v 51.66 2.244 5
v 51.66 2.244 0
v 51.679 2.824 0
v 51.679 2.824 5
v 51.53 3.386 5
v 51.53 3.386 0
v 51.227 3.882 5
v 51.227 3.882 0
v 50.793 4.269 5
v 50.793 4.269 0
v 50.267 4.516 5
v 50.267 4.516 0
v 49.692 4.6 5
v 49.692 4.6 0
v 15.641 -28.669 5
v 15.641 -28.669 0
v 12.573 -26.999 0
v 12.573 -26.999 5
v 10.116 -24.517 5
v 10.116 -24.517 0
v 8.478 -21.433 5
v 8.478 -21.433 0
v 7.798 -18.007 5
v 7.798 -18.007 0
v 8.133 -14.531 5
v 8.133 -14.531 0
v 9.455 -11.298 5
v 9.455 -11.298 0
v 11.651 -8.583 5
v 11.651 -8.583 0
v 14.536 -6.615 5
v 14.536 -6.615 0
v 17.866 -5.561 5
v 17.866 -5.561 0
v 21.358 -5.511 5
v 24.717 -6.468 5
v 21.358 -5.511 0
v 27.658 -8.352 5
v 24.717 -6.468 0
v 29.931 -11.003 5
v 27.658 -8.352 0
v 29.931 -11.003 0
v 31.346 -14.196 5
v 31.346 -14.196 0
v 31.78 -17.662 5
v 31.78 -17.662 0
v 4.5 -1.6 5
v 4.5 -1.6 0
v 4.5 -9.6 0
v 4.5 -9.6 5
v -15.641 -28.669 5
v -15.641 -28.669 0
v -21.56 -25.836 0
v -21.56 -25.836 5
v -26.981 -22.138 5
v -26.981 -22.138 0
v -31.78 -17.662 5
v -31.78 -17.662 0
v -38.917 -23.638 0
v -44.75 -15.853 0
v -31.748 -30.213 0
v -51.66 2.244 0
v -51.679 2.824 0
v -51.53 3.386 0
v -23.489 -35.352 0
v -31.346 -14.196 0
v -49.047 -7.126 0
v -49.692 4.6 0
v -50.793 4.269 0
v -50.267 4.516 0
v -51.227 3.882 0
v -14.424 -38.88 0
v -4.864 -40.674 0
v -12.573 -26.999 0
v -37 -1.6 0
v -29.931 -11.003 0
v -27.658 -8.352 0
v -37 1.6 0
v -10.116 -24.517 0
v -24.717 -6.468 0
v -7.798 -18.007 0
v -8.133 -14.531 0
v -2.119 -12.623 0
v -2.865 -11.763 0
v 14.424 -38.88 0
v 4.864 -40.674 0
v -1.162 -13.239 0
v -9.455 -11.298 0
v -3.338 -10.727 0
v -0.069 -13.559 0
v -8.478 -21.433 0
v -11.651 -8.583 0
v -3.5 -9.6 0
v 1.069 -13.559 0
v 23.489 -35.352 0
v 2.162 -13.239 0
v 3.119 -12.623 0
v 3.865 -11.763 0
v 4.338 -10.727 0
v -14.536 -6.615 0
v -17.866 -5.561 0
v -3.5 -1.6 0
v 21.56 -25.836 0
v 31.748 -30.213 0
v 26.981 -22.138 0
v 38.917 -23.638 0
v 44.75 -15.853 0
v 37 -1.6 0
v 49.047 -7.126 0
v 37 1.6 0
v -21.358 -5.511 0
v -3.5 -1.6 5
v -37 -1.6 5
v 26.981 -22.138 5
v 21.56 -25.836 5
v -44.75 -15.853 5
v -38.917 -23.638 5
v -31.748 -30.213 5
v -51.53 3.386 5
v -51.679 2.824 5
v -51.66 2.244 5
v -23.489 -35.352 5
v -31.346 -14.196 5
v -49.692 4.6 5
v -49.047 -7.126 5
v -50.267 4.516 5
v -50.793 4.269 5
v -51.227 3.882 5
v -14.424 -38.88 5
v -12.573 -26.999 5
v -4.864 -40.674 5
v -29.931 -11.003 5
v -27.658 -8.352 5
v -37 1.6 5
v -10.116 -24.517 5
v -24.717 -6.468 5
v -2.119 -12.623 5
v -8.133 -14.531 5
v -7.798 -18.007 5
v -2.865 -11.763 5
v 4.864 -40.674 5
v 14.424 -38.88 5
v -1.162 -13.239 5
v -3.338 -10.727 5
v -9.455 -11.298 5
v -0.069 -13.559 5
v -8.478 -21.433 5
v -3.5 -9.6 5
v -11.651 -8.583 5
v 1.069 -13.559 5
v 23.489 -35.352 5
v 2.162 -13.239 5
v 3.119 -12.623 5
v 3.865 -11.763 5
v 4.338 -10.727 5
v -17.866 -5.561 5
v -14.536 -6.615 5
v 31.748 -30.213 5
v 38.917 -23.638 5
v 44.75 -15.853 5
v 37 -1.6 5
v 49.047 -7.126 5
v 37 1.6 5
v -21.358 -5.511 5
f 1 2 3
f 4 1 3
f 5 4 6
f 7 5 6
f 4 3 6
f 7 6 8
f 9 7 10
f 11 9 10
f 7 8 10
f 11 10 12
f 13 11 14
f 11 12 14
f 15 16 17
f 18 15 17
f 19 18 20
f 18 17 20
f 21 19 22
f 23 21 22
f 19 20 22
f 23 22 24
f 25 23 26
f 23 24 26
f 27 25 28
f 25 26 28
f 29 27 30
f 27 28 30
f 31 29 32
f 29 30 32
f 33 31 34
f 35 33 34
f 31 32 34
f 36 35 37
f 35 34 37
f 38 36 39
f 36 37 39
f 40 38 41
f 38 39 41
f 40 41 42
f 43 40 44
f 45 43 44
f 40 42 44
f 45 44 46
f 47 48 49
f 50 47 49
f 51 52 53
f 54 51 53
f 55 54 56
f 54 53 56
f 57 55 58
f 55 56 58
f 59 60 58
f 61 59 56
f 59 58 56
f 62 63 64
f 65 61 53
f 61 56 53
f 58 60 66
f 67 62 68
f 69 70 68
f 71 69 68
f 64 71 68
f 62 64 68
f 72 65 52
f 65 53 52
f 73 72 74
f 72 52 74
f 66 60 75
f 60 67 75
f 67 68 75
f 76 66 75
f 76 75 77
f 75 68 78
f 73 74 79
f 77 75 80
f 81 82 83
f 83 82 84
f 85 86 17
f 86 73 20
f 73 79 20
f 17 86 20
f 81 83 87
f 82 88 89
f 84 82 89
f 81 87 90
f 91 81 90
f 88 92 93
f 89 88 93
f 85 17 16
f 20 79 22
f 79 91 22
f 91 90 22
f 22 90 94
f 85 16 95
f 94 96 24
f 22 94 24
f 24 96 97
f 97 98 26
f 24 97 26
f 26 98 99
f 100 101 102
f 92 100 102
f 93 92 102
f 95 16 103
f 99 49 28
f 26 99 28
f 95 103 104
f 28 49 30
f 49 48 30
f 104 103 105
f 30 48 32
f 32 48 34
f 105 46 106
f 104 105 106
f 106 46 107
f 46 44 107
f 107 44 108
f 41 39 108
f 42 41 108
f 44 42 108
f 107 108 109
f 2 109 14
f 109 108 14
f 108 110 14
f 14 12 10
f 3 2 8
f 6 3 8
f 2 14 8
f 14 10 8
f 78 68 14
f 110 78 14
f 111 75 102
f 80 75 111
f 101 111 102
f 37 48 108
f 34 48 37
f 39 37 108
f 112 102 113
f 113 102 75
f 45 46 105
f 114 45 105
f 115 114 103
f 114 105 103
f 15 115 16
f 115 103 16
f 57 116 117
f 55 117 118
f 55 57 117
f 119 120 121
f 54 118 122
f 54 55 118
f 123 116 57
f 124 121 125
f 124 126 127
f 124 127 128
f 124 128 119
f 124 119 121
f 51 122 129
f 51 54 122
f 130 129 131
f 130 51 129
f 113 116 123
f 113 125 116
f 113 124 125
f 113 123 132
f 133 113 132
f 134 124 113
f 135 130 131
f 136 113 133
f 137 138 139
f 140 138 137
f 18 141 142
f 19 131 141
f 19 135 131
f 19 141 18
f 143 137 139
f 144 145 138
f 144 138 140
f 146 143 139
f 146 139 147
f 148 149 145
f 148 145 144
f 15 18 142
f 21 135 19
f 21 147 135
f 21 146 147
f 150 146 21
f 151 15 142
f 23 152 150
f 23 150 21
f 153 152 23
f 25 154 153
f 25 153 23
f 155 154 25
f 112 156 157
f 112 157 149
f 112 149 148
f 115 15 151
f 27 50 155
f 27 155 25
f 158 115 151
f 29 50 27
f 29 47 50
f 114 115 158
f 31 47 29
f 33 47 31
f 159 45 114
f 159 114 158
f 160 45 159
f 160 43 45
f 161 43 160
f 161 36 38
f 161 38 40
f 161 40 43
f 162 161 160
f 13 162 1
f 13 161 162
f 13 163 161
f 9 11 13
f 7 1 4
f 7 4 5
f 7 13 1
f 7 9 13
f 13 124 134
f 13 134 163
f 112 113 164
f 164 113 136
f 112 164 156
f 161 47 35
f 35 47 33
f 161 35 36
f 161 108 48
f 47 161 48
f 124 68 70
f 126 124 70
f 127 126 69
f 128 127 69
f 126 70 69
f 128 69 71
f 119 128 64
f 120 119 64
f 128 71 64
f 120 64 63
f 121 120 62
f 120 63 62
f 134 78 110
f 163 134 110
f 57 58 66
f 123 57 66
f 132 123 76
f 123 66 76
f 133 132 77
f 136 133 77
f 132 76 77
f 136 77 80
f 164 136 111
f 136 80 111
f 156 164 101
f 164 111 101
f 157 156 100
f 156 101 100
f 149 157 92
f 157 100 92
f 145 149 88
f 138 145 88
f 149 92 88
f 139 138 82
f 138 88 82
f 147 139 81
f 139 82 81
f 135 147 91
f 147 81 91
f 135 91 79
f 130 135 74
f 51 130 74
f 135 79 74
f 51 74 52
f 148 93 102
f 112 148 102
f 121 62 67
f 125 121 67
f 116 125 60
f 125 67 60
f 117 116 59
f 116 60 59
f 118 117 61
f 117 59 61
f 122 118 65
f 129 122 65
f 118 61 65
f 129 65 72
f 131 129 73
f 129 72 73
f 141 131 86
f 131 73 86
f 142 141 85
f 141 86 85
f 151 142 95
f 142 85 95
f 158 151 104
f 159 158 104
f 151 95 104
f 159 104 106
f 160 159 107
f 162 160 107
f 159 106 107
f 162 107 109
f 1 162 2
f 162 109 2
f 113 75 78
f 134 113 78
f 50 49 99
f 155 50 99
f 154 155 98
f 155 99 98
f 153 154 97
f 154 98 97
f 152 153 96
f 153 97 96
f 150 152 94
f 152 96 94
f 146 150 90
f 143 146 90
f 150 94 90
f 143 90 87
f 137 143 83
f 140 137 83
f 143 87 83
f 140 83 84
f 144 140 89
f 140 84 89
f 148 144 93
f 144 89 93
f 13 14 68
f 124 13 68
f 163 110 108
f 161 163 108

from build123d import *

# Parameters (mm, degrees)
SALIENTE_EXTRUIR1_DEPTH = 5
SALIENTE_EXTRUIR2_DEPTH = 5


with BuildPart() as part:
    # Croquis1 → Saliente-Extruir1 (new body)
    with BuildSketch(Plane.XY):
        with BuildLine():
            ThreePointArc((-51.659530699, 2.243564356), (0, -40.9), (51.659530699, 2.243564356))
            ThreePointArc((51.659530699, 2.243564356), (51.226617189, 3.88201574), (49.691548577, 4.6))
            Line((49.691548577, 4.6), (-49.691548577, 4.6))
            ThreePointArc((-49.691548577, 4.6), (-51.226617189, 3.88201574), (-51.659530699, 2.243564356))
        make_face()
        with BuildLine():
            ThreePointArc((-3.5, -31.457984161), (-25.58189602, -23.211012568), (-40.04747183, -4.6))
            Line((-40.04747183, -4.6), (-5.5, -4.6))
            Line((-5.5, -4.6), (-5.5, -9.6))
            ThreePointArc((-5.5, -9.6), (-4.977225575, -12.049489743), (-3.5, -14.072135955))
            Line((-3.5, -14.072135955), (-3.5, -31.457984161))
        make_face(mode=Mode.SUBTRACT)
        with BuildLine():
            ThreePointArc((40.04747183, -4.6), (25.984811469, -22.911296309), (4.5, -31.364985744))
            Line((4.5, -31.364985744), (4.5, -14.072135955))
            ThreePointArc((4.5, -14.072135955), (5.977225575, -12.049489743), (6.5, -9.6))
            Line((6.5, -9.6), (6.5, -4.6))
            Line((6.5, -4.6), (40.04747183, -4.6))
        make_face(mode=Mode.SUBTRACT)
        with BuildLine():
            Line((-3.5, -1.6), (-37, -1.6))
            Line((-37, -1.6), (-37, 1.6))
            Line((-37, 1.6), (37, 1.6))
            Line((37, 1.6), (37, -1.6))
            Line((37, -1.6), (4.5, -1.6))
            Line((4.5, -1.6), (4.5, -9.6))
            ThreePointArc((4.5, -9.6), (0.5, -13.6), (-3.5, -9.6))
            Line((-3.5, -9.6), (-3.5, -1.6))
        make_face(mode=Mode.SUBTRACT)
    extrude(amount=SALIENTE_EXTRUIR1_DEPTH)

    # Croquis3 → Saliente-Extruir2 (add)
    with BuildSketch(Plane.XY):
        with BuildLine():
            Line((40.04747183, -4.6), (6.5, -4.6))
            Line((6.5, -4.6), (6.5, -9.6))
            ThreePointArc((6.5, -9.6), (5.977225575, -12.049489743), (4.5, -14.072135955))
            Line((4.5, -14.072135955), (4.5, -31.364985744))
            ThreePointArc((4.5, -31.364985744), (10.160094866, -30.388242072), (15.640583324, -28.66924575))
            ThreePointArc((15.640583324, -28.66924575), (13.021749092, -7.49311258), (31.780404624, -17.661679411))
            ThreePointArc((31.780404624, -17.661679411), (36.502915311, -11.503618196), (40.04747183, -4.6))
        make_face()
        with BuildLine():
            Line((-3.5, -31.457984161), (-3.5, -14.072135955))
            ThreePointArc((-3.5, -14.072135955), (-4.977225575, -12.049489743), (-5.5, -9.6))
            Line((-5.5, -9.6), (-5.5, -4.6))
            Line((-5.5, -4.6), (-40.04747183, -4.6))
            ThreePointArc((-40.04747183, -4.6), (-36.502915311, -11.503618196), (-31.780404624, -17.661679411))
            ThreePointArc((-31.780404624, -17.661679411), (-13.021749092, -7.49311258), (-15.640583324, -28.66924575))
            ThreePointArc((-15.640583324, -28.66924575), (-9.671336411, -30.50350641), (-3.5, -31.457984161))
        make_face()
    extrude(amount=SALIENTE_EXTRUIR2_DEPTH)


solid = part.part
